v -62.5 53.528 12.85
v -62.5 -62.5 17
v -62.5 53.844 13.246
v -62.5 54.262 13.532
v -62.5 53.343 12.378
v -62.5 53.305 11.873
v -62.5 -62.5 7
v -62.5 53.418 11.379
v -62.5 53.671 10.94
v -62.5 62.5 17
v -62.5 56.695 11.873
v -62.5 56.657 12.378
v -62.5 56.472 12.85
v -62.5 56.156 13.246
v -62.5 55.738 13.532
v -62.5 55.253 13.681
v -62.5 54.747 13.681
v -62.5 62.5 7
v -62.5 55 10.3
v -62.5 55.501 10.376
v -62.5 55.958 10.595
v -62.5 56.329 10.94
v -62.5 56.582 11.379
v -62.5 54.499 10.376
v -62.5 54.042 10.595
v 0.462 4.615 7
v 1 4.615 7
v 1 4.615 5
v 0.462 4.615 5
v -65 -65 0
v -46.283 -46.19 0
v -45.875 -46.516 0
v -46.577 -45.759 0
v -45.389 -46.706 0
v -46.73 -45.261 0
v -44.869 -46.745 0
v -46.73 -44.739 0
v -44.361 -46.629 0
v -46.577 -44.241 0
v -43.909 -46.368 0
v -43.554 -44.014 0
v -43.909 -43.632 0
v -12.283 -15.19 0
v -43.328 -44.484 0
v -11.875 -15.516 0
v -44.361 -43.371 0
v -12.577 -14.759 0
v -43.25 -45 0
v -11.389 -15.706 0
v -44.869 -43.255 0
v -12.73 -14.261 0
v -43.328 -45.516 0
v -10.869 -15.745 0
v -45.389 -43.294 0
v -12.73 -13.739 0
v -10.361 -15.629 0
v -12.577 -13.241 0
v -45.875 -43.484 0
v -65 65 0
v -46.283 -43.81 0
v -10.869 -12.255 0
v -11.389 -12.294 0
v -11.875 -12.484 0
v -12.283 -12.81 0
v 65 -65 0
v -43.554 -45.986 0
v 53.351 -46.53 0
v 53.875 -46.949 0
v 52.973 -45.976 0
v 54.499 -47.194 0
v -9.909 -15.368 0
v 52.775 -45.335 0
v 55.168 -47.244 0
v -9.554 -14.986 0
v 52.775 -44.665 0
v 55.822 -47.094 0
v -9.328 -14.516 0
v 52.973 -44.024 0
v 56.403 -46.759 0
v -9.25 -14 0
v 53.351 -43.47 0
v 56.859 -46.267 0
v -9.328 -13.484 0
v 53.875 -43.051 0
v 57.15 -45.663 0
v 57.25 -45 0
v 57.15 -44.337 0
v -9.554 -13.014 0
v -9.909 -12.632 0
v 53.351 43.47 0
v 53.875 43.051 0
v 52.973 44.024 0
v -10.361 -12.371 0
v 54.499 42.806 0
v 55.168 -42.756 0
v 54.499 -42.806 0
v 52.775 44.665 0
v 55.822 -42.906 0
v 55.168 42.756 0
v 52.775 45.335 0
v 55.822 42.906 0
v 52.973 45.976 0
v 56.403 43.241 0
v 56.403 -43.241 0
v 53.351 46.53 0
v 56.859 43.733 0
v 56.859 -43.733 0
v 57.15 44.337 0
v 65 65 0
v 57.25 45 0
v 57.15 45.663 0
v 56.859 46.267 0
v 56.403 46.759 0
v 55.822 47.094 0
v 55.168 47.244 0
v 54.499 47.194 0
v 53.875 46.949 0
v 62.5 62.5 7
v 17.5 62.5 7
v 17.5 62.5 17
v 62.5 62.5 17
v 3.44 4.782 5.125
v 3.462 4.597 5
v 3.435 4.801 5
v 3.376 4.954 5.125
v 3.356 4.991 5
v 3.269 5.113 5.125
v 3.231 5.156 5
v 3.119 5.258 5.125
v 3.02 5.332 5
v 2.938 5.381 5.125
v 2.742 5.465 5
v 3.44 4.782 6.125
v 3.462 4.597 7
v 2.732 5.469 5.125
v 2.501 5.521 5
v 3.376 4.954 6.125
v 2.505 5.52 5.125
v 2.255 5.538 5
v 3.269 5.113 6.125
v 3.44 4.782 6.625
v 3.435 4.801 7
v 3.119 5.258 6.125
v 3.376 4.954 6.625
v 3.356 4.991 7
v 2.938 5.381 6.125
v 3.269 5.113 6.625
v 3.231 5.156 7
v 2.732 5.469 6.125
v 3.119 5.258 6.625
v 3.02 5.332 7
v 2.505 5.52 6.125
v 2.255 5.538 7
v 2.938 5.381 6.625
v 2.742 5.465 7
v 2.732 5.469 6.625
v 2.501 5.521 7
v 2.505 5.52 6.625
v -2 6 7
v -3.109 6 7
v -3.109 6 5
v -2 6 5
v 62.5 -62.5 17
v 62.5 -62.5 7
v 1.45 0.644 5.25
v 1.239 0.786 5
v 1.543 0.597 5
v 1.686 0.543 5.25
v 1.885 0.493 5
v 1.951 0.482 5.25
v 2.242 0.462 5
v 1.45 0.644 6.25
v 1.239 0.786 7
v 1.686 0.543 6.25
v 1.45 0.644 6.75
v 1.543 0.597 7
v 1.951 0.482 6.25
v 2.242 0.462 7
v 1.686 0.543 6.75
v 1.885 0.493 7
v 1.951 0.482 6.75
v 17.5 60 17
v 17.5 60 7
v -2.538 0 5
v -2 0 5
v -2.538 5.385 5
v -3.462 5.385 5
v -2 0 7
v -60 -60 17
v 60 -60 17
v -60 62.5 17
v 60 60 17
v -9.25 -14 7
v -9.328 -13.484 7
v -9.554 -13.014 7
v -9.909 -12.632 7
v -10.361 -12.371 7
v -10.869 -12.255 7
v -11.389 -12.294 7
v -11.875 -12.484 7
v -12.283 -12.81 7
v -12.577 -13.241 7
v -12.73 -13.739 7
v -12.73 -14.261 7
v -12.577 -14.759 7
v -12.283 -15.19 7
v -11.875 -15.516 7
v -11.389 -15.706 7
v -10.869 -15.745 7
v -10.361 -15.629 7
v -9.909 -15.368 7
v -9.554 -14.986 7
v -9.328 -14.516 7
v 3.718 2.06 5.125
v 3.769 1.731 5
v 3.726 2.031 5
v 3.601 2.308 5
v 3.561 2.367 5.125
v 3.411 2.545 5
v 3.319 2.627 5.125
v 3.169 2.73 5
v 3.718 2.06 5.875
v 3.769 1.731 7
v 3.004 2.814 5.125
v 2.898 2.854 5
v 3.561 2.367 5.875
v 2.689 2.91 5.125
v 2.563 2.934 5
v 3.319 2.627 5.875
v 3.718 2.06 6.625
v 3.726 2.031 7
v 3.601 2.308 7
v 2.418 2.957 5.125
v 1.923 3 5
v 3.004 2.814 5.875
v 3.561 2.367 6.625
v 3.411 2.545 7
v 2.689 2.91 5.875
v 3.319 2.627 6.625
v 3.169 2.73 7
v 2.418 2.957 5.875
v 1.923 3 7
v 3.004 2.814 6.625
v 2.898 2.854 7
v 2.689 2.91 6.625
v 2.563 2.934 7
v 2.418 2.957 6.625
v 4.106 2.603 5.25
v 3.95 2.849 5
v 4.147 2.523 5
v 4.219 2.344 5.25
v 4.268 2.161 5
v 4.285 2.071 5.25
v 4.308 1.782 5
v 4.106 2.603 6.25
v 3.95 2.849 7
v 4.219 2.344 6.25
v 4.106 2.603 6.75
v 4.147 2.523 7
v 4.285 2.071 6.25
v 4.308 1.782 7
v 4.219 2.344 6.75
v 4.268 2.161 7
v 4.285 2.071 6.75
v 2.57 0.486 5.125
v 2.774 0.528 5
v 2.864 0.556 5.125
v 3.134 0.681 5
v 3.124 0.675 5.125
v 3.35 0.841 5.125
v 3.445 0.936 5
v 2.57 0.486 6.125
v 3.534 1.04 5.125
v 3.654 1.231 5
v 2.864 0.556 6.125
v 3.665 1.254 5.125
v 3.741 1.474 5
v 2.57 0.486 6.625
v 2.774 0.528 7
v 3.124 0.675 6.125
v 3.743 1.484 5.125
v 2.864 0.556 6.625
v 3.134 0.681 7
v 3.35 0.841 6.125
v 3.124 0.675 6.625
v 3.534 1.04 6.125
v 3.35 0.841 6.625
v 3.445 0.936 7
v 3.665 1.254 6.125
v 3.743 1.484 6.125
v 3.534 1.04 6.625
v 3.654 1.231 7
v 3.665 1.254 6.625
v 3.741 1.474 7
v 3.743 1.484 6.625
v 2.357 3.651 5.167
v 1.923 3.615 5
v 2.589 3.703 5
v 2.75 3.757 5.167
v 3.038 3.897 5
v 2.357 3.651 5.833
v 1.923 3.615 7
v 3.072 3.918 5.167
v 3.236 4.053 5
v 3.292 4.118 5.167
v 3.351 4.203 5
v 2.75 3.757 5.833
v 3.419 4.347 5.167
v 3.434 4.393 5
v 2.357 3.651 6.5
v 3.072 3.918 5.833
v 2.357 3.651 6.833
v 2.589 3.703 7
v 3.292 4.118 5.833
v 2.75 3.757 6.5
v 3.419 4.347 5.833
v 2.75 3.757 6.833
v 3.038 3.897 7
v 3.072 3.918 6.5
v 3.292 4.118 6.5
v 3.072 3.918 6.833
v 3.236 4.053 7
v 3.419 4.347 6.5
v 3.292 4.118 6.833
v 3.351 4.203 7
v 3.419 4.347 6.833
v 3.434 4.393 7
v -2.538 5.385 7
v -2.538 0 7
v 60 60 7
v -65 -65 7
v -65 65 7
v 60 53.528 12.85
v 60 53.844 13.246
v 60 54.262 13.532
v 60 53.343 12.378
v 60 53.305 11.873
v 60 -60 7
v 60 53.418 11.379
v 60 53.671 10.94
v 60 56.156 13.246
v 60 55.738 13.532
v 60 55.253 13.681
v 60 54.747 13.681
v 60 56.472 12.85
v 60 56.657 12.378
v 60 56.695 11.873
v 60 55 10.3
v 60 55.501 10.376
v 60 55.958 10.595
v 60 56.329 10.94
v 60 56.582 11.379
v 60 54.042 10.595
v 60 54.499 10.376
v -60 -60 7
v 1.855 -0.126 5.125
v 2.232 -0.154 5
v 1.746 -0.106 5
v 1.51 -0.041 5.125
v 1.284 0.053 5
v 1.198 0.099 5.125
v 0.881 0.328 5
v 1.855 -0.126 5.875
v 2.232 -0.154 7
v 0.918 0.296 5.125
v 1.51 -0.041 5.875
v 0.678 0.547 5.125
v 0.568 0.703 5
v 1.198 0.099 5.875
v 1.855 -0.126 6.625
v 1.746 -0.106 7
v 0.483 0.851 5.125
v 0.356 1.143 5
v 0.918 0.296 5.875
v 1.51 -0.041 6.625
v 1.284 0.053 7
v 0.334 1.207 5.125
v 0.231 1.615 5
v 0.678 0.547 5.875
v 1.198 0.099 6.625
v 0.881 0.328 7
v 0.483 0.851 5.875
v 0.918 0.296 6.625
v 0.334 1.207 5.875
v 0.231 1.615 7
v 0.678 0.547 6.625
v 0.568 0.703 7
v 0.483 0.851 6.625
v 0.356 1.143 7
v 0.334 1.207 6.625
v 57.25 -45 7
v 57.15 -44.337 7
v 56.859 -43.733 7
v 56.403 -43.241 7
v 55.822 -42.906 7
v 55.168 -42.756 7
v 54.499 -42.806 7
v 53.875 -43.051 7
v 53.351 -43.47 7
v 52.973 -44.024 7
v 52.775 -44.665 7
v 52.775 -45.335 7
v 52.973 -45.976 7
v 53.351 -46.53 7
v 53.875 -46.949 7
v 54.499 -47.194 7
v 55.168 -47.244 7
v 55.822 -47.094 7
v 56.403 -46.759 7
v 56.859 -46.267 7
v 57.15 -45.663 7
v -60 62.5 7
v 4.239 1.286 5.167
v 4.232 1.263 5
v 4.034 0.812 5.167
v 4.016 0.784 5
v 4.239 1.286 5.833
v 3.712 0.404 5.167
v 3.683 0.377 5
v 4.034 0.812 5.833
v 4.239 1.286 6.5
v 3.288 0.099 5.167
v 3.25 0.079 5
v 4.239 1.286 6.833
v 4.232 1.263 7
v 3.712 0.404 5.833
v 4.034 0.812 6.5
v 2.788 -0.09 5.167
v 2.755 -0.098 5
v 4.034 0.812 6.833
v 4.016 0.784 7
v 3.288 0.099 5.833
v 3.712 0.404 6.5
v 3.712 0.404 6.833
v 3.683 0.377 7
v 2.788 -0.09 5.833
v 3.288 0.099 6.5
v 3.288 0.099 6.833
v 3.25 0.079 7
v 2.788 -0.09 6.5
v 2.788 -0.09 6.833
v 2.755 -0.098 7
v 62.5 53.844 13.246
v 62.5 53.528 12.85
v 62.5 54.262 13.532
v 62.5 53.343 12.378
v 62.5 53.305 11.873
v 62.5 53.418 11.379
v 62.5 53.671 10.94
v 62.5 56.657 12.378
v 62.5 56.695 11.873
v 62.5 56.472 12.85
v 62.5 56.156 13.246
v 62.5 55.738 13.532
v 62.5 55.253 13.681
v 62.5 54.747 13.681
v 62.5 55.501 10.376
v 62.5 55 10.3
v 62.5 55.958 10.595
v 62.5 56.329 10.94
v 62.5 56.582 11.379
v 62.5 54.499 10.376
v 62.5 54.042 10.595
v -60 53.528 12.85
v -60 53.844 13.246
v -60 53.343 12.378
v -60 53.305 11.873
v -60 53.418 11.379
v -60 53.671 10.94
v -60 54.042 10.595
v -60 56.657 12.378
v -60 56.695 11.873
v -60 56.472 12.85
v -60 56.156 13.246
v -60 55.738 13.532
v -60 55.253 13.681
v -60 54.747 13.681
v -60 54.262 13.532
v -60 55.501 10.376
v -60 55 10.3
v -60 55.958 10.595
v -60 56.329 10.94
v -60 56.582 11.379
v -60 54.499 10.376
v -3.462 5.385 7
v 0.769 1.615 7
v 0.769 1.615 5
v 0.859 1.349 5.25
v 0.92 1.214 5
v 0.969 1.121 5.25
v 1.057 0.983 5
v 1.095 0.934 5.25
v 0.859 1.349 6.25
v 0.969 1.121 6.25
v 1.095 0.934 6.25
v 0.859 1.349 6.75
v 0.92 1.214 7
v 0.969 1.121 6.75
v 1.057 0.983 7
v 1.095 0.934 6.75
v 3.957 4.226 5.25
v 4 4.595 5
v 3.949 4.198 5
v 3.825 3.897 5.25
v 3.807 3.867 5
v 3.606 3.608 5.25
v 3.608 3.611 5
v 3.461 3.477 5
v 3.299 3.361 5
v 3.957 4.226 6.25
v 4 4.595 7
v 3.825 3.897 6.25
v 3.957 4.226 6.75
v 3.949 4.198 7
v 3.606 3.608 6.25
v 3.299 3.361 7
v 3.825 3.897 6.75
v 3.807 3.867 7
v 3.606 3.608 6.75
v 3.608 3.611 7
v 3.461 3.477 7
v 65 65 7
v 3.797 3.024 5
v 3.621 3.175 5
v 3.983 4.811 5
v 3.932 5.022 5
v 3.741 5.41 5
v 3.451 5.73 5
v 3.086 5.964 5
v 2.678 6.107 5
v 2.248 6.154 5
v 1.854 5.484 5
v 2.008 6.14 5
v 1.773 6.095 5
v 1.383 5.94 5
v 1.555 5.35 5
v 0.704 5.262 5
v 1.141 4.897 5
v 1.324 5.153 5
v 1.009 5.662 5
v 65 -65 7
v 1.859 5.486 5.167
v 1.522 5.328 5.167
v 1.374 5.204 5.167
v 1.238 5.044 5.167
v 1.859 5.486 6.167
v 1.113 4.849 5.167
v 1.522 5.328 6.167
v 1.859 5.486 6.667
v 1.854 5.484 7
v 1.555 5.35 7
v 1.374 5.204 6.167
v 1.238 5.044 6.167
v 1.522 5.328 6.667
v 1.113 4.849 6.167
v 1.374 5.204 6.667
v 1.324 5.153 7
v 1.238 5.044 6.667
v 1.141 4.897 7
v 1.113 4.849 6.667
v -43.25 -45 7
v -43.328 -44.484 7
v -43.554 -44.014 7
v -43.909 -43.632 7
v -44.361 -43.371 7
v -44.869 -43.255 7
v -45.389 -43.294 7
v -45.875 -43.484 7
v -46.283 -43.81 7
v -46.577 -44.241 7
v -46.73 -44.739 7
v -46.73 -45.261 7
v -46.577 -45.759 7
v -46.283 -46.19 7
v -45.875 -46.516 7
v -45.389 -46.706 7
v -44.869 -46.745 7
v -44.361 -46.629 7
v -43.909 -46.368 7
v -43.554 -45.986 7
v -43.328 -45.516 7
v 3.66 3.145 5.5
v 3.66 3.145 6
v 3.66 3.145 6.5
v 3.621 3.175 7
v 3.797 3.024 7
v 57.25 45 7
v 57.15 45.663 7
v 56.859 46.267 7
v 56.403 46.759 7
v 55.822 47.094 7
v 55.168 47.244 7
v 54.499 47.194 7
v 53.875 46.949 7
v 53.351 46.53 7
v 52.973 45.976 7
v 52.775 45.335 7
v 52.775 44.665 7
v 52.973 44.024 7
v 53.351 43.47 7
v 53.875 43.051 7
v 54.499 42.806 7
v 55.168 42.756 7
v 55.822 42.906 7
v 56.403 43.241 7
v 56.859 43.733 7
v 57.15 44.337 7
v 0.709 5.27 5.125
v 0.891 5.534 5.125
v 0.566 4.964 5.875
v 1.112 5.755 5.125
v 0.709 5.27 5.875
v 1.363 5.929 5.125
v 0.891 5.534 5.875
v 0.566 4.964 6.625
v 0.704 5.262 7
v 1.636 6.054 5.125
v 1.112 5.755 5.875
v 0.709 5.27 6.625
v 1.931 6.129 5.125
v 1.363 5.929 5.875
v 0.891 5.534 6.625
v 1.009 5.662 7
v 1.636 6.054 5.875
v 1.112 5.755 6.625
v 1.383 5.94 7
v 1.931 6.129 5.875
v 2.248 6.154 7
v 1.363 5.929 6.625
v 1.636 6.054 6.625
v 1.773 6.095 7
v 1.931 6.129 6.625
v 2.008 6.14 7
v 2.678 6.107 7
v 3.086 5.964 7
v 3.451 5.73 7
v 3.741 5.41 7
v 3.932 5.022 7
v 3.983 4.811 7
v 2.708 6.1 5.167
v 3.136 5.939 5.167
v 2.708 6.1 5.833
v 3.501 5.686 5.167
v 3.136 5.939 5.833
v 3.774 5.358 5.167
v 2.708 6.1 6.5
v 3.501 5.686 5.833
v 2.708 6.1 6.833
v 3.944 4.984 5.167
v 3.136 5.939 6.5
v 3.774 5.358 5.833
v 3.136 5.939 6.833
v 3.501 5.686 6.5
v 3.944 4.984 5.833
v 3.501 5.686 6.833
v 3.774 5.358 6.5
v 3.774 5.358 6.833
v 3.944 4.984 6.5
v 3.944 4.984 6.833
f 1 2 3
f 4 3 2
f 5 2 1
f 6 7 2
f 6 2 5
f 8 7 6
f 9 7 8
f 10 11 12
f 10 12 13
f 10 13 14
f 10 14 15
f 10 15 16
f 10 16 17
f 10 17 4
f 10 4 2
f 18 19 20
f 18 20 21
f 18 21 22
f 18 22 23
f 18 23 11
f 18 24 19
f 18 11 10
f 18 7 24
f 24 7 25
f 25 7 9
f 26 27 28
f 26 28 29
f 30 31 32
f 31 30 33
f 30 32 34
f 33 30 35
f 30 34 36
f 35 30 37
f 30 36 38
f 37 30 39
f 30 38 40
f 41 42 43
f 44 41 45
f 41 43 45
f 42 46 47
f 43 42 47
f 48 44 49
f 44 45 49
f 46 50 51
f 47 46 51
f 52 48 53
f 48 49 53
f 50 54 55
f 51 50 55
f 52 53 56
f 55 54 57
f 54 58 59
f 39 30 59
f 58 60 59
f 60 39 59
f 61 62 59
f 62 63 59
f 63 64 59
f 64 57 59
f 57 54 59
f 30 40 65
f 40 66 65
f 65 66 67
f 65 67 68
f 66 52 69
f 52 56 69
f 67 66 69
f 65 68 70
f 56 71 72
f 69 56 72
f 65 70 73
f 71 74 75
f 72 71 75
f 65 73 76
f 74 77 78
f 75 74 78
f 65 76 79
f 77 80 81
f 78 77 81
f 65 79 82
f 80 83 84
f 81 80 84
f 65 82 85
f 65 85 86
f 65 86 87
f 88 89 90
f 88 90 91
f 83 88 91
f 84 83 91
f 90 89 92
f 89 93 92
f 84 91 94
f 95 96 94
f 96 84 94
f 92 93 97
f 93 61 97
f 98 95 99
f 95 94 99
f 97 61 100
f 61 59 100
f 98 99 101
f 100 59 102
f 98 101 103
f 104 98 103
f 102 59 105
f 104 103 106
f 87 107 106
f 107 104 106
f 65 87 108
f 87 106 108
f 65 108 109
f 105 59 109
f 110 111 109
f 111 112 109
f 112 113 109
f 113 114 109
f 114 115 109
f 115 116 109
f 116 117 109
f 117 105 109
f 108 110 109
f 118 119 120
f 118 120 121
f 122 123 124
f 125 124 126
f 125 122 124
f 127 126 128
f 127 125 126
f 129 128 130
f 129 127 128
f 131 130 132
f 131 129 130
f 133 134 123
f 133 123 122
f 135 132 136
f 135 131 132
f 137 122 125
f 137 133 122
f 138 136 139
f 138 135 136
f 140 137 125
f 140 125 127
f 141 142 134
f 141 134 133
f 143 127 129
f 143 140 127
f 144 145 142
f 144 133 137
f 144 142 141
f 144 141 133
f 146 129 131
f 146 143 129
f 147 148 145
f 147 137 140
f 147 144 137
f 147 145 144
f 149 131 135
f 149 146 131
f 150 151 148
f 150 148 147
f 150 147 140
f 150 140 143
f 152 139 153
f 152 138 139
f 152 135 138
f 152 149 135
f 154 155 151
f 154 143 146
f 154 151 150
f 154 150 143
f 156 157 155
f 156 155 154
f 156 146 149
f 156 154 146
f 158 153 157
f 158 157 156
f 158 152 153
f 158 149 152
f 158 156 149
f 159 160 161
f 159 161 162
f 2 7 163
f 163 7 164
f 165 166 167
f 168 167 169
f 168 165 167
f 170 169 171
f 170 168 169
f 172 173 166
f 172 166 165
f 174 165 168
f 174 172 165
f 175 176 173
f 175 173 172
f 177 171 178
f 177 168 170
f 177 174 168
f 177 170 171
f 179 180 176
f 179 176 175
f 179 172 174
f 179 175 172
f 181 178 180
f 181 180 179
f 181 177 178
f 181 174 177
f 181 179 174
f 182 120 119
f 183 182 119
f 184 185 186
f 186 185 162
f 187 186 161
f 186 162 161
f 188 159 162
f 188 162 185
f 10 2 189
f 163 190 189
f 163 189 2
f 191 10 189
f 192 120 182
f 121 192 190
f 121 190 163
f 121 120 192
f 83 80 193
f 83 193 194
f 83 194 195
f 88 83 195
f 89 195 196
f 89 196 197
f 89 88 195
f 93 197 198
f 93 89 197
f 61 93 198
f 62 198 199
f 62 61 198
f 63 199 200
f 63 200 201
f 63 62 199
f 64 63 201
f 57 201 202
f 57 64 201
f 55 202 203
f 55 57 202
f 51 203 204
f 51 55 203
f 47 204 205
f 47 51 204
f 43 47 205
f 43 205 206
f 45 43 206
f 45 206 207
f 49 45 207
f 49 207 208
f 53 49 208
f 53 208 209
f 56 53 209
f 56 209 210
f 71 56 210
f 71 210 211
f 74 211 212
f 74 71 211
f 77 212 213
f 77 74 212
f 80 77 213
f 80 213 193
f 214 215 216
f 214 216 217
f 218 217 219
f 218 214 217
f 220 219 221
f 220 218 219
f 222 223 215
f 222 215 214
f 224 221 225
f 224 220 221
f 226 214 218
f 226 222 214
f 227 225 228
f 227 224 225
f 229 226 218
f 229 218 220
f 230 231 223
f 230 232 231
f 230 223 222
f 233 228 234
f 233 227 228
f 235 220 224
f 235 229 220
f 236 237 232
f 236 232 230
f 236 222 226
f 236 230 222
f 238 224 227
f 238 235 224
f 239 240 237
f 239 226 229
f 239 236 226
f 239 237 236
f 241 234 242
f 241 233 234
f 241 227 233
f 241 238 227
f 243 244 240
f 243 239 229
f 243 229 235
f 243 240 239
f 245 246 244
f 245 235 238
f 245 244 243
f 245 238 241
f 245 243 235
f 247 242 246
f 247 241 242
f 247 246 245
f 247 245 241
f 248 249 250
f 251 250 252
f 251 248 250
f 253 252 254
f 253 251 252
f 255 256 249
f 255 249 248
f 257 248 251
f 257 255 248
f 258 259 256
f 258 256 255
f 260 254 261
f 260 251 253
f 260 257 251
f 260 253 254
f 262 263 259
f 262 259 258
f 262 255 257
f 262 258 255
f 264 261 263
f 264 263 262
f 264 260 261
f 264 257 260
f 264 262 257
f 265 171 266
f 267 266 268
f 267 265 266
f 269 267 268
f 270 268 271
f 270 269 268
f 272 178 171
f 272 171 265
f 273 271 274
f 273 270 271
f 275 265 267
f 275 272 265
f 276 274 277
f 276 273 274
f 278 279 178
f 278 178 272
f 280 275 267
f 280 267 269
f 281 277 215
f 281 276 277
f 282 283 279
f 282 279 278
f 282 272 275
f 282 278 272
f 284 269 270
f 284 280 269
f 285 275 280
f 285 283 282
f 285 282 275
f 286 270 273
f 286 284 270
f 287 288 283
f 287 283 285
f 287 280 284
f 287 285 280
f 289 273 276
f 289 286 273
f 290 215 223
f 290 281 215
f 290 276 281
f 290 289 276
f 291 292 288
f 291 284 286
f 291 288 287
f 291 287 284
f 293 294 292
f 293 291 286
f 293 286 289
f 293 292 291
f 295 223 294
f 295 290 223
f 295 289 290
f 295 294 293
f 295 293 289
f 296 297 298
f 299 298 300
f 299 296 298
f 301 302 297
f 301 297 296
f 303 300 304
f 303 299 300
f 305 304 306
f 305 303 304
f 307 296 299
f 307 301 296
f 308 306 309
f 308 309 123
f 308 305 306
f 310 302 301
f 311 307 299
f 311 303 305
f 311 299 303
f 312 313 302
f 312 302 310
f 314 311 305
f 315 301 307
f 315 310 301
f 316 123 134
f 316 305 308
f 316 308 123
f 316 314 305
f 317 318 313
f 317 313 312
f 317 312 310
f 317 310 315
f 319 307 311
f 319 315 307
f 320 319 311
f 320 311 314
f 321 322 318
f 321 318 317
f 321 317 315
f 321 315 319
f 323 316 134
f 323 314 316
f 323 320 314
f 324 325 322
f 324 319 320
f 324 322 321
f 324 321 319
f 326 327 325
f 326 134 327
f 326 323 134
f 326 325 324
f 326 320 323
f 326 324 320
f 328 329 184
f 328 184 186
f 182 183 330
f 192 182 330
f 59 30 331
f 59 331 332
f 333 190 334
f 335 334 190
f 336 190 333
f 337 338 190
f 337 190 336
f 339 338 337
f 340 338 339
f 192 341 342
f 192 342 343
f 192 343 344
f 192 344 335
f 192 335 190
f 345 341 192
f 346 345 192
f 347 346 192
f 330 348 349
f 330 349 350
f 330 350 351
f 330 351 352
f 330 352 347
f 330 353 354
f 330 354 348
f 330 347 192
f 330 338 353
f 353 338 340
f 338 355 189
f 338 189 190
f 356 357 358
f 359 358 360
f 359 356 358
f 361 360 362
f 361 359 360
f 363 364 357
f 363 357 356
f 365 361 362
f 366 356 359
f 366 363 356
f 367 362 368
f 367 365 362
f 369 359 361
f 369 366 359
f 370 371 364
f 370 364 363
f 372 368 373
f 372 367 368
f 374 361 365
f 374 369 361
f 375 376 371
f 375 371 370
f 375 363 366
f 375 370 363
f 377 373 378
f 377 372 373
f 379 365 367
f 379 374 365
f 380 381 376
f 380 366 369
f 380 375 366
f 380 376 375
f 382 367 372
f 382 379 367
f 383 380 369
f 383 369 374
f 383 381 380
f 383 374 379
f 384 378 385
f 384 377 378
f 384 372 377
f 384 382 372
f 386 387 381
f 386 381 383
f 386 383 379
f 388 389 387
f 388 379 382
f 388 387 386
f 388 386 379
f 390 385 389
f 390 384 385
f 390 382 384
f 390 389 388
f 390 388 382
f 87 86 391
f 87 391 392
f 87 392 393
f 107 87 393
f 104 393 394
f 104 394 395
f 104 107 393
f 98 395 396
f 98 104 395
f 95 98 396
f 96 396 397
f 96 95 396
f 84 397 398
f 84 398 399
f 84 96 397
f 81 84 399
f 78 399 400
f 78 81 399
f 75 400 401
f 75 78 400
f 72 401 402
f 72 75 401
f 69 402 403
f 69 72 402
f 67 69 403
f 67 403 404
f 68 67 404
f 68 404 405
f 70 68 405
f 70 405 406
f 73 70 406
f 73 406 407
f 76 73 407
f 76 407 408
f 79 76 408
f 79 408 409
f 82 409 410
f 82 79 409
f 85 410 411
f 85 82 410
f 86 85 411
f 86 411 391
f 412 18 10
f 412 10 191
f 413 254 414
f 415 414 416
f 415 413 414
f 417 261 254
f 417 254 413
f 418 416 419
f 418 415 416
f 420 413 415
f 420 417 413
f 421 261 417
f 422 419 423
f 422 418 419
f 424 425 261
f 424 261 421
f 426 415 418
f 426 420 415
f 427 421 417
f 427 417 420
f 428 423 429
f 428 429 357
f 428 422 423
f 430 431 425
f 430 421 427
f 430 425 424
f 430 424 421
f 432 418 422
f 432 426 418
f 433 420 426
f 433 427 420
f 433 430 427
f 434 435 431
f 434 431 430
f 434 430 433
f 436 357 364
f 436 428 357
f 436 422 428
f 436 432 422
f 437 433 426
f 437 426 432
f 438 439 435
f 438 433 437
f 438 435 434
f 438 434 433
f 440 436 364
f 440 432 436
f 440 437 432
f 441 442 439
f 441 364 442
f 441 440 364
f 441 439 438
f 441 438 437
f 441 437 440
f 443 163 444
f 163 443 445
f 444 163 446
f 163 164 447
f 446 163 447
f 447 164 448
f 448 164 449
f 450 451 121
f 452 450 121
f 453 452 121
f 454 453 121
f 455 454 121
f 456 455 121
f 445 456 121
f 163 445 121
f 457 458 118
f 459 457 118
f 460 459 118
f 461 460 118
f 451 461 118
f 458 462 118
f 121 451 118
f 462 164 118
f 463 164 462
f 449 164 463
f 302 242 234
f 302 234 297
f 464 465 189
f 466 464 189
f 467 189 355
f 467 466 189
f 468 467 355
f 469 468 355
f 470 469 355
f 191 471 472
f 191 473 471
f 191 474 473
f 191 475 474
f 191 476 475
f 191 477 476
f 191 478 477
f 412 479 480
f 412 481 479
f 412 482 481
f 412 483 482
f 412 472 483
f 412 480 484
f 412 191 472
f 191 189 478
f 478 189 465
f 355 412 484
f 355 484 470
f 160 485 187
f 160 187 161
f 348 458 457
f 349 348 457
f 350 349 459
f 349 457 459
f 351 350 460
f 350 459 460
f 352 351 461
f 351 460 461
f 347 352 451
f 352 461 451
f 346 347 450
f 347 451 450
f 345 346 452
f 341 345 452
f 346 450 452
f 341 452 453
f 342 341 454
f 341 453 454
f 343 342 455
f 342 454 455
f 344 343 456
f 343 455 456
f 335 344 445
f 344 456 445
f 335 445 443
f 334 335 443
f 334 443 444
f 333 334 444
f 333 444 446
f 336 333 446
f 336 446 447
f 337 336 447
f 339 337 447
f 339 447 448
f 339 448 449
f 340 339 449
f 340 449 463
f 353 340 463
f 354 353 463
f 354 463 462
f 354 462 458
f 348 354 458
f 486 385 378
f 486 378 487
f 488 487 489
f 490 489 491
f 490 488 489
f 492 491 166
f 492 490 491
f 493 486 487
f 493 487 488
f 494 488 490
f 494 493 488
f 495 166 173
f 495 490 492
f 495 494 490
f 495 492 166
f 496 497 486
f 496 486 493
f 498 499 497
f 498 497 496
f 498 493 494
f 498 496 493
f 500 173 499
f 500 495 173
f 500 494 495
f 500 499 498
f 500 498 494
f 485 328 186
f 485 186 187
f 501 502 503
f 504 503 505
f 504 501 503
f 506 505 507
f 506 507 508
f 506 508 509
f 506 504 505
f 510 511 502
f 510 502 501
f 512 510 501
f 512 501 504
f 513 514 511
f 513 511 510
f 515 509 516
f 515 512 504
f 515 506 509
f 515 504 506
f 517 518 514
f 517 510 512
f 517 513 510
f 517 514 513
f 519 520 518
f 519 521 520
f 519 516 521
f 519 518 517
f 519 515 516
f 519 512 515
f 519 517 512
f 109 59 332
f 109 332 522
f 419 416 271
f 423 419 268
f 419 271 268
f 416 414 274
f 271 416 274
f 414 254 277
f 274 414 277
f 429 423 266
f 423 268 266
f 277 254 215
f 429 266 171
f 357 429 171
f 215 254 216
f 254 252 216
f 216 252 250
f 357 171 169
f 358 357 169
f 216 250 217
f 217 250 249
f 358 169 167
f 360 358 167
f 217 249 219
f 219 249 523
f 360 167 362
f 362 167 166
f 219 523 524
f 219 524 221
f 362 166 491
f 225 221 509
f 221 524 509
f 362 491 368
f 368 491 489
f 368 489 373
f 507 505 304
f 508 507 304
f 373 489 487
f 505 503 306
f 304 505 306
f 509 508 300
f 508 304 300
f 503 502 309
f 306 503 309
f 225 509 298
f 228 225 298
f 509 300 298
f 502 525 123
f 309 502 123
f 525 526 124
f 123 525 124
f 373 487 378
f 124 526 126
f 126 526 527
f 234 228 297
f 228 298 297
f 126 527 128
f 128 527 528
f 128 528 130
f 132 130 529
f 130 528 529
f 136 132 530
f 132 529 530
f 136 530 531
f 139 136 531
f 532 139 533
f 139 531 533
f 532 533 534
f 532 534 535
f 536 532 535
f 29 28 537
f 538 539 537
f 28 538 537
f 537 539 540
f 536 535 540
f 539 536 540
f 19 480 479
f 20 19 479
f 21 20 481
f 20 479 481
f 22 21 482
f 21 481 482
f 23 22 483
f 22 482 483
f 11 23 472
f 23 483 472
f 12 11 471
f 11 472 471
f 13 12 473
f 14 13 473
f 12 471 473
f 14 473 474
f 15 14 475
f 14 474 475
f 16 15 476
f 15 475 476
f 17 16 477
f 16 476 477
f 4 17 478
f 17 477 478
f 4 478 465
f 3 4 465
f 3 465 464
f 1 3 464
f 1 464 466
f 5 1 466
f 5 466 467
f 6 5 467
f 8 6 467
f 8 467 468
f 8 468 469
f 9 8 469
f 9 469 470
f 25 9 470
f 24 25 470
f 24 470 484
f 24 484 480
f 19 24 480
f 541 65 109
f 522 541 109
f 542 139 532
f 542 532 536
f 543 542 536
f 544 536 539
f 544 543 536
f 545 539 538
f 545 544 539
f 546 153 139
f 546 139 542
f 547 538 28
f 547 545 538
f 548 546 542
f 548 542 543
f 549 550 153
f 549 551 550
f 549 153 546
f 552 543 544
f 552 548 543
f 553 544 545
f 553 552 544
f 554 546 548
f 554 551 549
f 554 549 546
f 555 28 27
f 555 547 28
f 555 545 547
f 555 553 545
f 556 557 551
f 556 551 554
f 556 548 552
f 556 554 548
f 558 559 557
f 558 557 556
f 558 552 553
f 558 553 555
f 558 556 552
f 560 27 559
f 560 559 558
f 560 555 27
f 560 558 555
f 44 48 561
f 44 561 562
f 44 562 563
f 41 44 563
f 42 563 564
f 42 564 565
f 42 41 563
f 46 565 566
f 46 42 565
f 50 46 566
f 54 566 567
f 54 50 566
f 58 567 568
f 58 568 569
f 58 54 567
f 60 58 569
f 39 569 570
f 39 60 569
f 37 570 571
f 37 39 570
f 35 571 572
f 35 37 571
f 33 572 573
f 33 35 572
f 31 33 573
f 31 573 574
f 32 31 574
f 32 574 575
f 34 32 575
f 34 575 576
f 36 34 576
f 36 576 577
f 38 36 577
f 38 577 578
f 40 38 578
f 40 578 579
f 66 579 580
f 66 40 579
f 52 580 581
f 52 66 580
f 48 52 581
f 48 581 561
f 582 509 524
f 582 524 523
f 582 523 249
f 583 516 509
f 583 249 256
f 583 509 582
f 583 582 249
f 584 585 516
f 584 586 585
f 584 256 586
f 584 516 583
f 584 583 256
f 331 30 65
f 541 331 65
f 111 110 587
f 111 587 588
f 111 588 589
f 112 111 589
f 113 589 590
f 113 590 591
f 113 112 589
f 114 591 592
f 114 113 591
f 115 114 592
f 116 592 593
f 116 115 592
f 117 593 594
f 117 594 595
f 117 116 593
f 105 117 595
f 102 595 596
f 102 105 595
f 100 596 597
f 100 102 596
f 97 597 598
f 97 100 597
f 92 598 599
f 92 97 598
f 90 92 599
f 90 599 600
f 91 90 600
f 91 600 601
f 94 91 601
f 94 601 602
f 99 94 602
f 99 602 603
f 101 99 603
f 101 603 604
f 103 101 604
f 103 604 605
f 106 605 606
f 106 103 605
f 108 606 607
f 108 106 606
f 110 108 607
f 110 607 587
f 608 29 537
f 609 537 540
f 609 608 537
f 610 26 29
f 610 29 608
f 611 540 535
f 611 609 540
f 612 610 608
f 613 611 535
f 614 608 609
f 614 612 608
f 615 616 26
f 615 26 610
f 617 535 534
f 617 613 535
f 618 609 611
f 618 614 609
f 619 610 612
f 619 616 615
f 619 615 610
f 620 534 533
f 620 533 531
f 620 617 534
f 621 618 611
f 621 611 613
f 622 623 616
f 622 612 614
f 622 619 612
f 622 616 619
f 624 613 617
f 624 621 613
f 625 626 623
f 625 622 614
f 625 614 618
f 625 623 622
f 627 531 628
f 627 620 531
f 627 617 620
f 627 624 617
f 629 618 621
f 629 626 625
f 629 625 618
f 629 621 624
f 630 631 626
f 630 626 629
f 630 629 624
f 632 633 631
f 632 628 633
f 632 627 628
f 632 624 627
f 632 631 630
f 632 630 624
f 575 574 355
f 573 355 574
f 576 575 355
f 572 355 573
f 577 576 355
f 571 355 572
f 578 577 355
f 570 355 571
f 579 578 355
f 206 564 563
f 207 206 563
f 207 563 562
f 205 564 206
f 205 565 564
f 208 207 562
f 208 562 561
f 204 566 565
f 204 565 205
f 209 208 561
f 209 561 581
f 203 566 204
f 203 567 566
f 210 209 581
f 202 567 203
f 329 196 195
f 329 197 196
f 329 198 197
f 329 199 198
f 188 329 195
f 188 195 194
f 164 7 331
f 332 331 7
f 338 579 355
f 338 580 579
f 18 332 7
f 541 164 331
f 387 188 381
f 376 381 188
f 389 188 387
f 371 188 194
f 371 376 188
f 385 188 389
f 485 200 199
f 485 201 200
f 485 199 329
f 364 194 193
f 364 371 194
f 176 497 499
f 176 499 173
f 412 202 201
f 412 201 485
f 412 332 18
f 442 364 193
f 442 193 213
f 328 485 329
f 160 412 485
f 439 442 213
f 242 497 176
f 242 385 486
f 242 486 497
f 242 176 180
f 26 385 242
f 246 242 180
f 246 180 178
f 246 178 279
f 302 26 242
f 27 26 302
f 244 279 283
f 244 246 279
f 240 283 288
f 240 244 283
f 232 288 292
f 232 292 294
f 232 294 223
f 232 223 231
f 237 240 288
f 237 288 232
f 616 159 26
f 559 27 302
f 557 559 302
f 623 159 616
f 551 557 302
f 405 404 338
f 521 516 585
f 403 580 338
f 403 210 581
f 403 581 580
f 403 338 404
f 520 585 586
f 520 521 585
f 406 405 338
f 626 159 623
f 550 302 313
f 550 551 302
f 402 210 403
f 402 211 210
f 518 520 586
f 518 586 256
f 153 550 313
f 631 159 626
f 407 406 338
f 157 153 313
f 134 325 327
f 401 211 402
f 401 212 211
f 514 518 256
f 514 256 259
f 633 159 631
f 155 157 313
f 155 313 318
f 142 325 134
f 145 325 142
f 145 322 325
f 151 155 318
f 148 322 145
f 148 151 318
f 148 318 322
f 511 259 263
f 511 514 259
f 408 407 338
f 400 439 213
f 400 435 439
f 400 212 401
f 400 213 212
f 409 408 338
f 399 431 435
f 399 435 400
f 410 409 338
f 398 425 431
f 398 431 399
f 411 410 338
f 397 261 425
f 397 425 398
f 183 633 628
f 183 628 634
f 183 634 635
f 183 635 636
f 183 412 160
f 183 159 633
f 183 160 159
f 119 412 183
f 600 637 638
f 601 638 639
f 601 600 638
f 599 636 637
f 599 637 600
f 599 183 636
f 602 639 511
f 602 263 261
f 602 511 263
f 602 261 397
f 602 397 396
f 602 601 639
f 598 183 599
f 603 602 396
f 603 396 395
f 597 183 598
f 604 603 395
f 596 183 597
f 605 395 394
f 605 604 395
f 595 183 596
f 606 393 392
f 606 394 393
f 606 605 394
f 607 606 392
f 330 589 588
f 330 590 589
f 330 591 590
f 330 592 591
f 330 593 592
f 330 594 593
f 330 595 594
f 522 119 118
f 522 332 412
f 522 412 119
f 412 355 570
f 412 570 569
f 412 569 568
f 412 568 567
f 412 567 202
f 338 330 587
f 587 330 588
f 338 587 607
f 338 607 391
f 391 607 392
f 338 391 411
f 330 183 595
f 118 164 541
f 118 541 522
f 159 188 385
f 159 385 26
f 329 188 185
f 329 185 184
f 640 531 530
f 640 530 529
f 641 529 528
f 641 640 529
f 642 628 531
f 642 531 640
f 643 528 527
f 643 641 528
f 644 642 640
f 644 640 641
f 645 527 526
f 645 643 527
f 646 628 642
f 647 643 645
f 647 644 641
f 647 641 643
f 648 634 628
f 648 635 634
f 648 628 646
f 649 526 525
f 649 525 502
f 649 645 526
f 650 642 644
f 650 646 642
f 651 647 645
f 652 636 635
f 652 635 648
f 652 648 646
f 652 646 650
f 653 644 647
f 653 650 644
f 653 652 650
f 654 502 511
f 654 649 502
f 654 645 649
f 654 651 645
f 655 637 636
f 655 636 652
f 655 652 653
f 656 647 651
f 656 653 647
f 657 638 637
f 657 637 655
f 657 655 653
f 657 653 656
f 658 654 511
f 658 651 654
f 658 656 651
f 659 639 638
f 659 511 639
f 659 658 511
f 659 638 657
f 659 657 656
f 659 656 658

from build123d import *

# Parameters (mm, degrees)
CROQUIS1_W              = 130
CROQUIS1_H              = 130
CROQUIS1_R              = 1.75
CROQUIS1_R_2            = 2.25
SALIENTE_EXTRUIR1_DEPTH = 7
CORTAR_EXTRUIR1_DEPTH   = 2
CROQUIS4_W              = 125
CROQUIS4_H              = 125
CROQUIS4_W_2            = 120
CROQUIS4_H_2            = 120
SALIENTE_EXTRUIR2_DEPTH = 10
CROQUIS6_R              = 1.7
CORTAR_EXTRUIR2_DEPTH   = 145.118874545
CORTAR_EXTRUIR3_REACH   = 146.119
CROQUIS7_W              = 77.5
CROQUIS7_H              = 10


with BuildPart() as part:
    # Croquis1 → Saliente-Extruir1 (new body)
    with BuildSketch(Plane.XY):
        Rectangle(CROQUIS1_W, CROQUIS1_H)
        with Locations((-11, -14)):
            Circle(CROQUIS1_R, mode=Mode.SUBTRACT)
        with Locations((-45, -45)):
            Circle(CROQUIS1_R, mode=Mode.SUBTRACT)
        with Locations((55, 45)):
            Circle(CROQUIS1_R_2, mode=Mode.SUBTRACT)
        with Locations((55, -45)):
            Circle(CROQUIS1_R_2, mode=Mode.SUBTRACT)
    extrude(amount=SALIENTE_EXTRUIR1_DEPTH)

    # Croquis2 → Cortar-Extruir1 (cut)
    with BuildSketch(Plane.XY.offset(7)):
        Polygon((-3.109375, 6), (-2, 6), (-2, 0), (-2.538461538, 0), (-2.538461538, 5.384615385), (-3.461538462, 5.384615385), align=None)
        with BuildLine():
            Line((1, 4.615384615), (0.461538462, 4.615384615))
            add(Edge.make_bspline(
                [(0.461538462, 4.615384615), (0.476126263, 4.675783159), (0.504644221, 4.793857373), (0.564125775, 4.962555534), (0.628924499, 5.122195856), (0.706734392, 5.269789126), (0.791606542, 5.40830153), (0.888845493, 5.534591458), (0.993965018, 5.651870827), (1.110236359, 5.755950663), (1.232171208, 5.850198199), (1.361487699, 5.93055544), (1.495584088, 5.999682559), (1.635389459, 6.056631528), (1.781320039, 6.099532426), (1.932056536, 6.130658378), (2.087993965, 6.150871717), (2.193846977, 6.152844454), (2.247596154, 6.153846154)],
                knots=[0, 0, 0, 0, 1.162005537, 2.271625781, 3.343758855, 4.383309926, 5.390229558, 6.379919256, 7.361854164, 8.333198761, 9.295911338, 10.242430842, 11.177959212, 12.116337295, 13.062827104, 14.020064771, 14.994644689, 16, 16, 16, 16], degree=3))
            add(Edge.make_bspline(
                [(2.247596154, 6.153846154), (2.325909426, 6.151481759), (2.48082773, 6.146804544), (2.708421525, 6.104094082), (2.927896072, 6.03650814), (3.136849069, 5.943124608), (3.33093781, 5.827946357), (3.503628416, 5.690863951), (3.652580149, 5.534522291), (3.777541939, 5.361837895), (3.875384795, 5.177285593), (3.947532863, 4.987342467), (3.991455745, 4.792459087), (3.997148128, 4.66087518), (4, 4.594951923)],
                knots=[0, 0, 0, 0, 1.083050992, 2.142477498, 3.193116406, 4.255571735, 5.30263384, 6.308962982, 7.297363603, 8.282367274, 9.249857812, 10.179914175, 11.08814088, 12, 12, 12, 12], degree=3))
            add(Edge.make_bspline(
                [(4, 4.594951923), (3.998005272, 4.531511704), (3.9941019, 4.407369039), (3.960958405, 4.226132187), (3.905181954, 4.055318015), (3.827919504, 3.894207451), (3.727905418, 3.743822011), (3.606752223, 3.603823341), (3.463604803, 3.473590499), (3.355126624, 3.398985688), (3.299278846, 3.360576923)],
                knots=[0, 0, 0, 0, 1.024540389, 2.004866551, 2.965041327, 3.920577974, 4.882998113, 5.874504559, 6.905732034, 8, 8, 8, 8], degree=3))
            add(Edge.make_bspline(
                [(3.299278846, 3.360576923), (3.363104711, 3.3297572), (3.48956221, 3.268694416), (3.661934546, 3.148941689), (3.818410904, 3.010673665), (3.905674422, 2.902771974), (3.949519231, 2.848557692)],
                knots=[0, 0, 0, 0, 1.015518401, 2.012035669, 3.001164323, 4, 4, 4, 4], degree=3))
            add(Edge.make_bspline(
                [(3.949519231, 2.848557692), (3.978390103, 2.809030118), (4.035659068, 2.730622261), (4.106348554, 2.604559817), (4.170478465, 2.477100121), (4.220450269, 2.344826853), (4.259148327, 2.209273116), (4.286810096, 2.070206151), (4.303994338, 1.927512398), (4.306455284, 1.830976718), (4.307692308, 1.782451923)],
                knots=[0, 0, 0, 0, 1.025084078, 2.033381695, 3.024893161, 4.013698104, 4.991890475, 5.976764909, 6.982997093, 8, 8, 8, 8], degree=3))
            add(Edge.make_bspline(
                [(4.307692308, 1.782451923), (4.304615999, 1.698435258), (4.298477858, 1.530797312), (4.243613731, 1.283126361), (4.158562461, 1.0410255), (4.037779142, 0.809468632), (3.890577699, 0.592816551), (3.715450857, 0.39897145), (3.514388443, 0.232345271), (3.290150187, 0.093127737), (3.047206539, -0.01816013), (2.787362667, -0.09540146), (2.514362574, -0.145708888), (2.327150064, -0.151103521), (2.231971154, -0.153846154)],
                knots=[0, 0, 0, 0, 0.955779014, 1.907060117, 2.875433937, 3.871313158, 4.872415639, 5.851225146, 6.836215519, 7.83643374, 8.849228613, 9.86973379, 10.916971861, 12, 12, 12, 12], degree=3))
            add(Edge.make_bspline(
                [(2.231971154, -0.153846154), (2.167823782, -0.152357788), (2.041603145, -0.149429181), (1.856042862, -0.129408722), (1.678919949, -0.092842999), (1.509994924, -0.043637332), (1.349117718, 0.018748511), (1.196779252, 0.096437708), (1.052042292, 0.187828854), (0.916272662, 0.294000719), (0.789486545, 0.41276873), (0.675053304, 0.546241319), (0.571065087, 0.691951154), (0.480306278, 0.851590679), (0.398642931, 1.023096834), (0.331475577, 1.208665688), (0.272357459, 1.406638298), (0.24487152, 1.544600138), (0.230769231, 1.615384615)],
                knots=[0, 0, 0, 0, 1.048658725, 2.063410685, 3.046034179, 4.001477787, 4.936774919, 5.862367409, 6.792675028, 7.730719943, 8.675894397, 9.627829632, 10.600096036, 11.597688215, 12.626045268, 13.701542398, 14.82072376, 16, 16, 16, 16], degree=3))
            Line((0.230769231, 1.615384615), (0.769230769, 1.615384615))
            add(Edge.make_bspline(
                [(0.769230769, 1.615384615), (0.783259269, 1.569186307), (0.810545919, 1.479326584), (0.856993287, 1.350000346), (0.909910325, 1.231443683), (0.96667814, 1.122786903), (1.026298333, 1.022959927), (1.093009633, 0.934602437), (1.161871025, 0.853833519), (1.213778488, 0.80832847), (1.239182692, 0.786057692)],
                knots=[0, 0, 0, 0, 1.198163088, 2.33053128, 3.407730985, 4.417276592, 5.372219308, 6.28897303, 7.162600585, 8, 8, 8, 8], degree=3))
            add(Edge.make_bspline(
                [(1.239182692, 0.786057692), (1.272776823, 0.760157691), (1.339861388, 0.708437637), (1.449178356, 0.642434845), (1.564146732, 0.585244516), (1.687257602, 0.54155818), (1.815854352, 0.504567905), (1.952015549, 0.480361301), (2.094539921, 0.463753007), (2.191856087, 0.46228741), (2.241586538, 0.461538462)],
                knots=[0, 0, 0, 0, 0.946170439, 1.889420265, 2.845303464, 3.807233317, 4.801018734, 5.828864929, 6.890507805, 8, 8, 8, 8], degree=3))
            add(Edge.make_bspline(
                [(2.241586538, 0.461538462), (2.2977354, 0.462594299), (2.407529652, 0.464658898), (2.567737982, 0.483645824), (2.72015075, 0.511297962), (2.863075765, 0.554005932), (2.998385206, 0.606773106), (3.12418232, 0.673027515), (3.242118502, 0.750761324), (3.350683197, 0.839114167), (3.448304067, 0.93583673), (3.534257518, 1.037001995), (3.607328367, 1.142183417), (3.666271643, 1.251963053), (3.712815444, 1.365886303), (3.744500931, 1.484272867), (3.766532099, 1.606153895), (3.768326292, 1.689003556), (3.769230769, 1.730769231)],
                knots=[0, 0, 0, 0, 1.217147791, 2.380027433, 3.494444702, 4.572153297, 5.609568379, 6.639424714, 7.649109417, 8.668170816, 9.669597737, 10.625200337, 11.543417969, 12.441394052, 13.322311151, 14.205496177, 15.095365482, 16, 16, 16, 16], degree=3))
            add(Edge.make_bspline(
                [(3.769230769, 1.730769231), (3.766607395, 1.786674383), (3.761373701, 1.898206512), (3.721416136, 2.062293782), (3.655692369, 2.22039106), (3.563682349, 2.369800986), (3.451678243, 2.50827396), (3.320766974, 2.631825073), (3.16986144, 2.7337738), (3.030970236, 2.804211497), (2.907944253, 2.852275055), (2.802660737, 2.884289279), (2.684792274, 2.911398403), (2.555764247, 2.93661944), (2.414604448, 2.958084609), (2.261466554, 2.975984864), (2.096319534, 2.990307791), (1.981991821, 2.996703955), (1.923076923, 3)],
                knots=[0, 0, 0, 0, 1.07054697, 2.135767047, 3.216561865, 4.33974944, 5.486079747, 6.621378074, 7.775625952, 8.963672916, 9.598146892, 10.304877434, 11.070270905, 11.915000392, 12.823868403, 13.805723172, 14.86925407, 16, 16, 16, 16], degree=3))
            Line((1.923076923, 3), (1.923076923, 3.615384615))
            add(Edge.make_bspline(
                [(1.923076923, 3.615384615), (1.997307493, 3.616644279), (2.142706944, 3.61911165), (2.355097181, 3.648953954), (2.558194287, 3.690235031), (2.747497274, 3.753466789), (2.920037925, 3.826907298), (3.069728672, 3.912368228), (3.194472353, 4.007364941), (3.293662761, 4.1133637), (3.368284296, 4.227046639), (3.42284452, 4.345532337), (3.455073651, 4.469859299), (3.459375937, 4.554707301), (3.461538462, 4.597355769)],
                knots=[0, 0, 0, 0, 1.321986639, 2.589447074, 3.816329219, 5.01088745, 6.139805852, 7.153945165, 8.075214402, 8.924034688, 9.728124013, 10.488707548, 11.240355623, 12, 12, 12, 12], degree=3))
            add(Edge.make_bspline(
                [(3.461538462, 4.597355769), (3.460828043, 4.628689047), (3.459414698, 4.691025116), (3.441590793, 4.782096662), (3.414806723, 4.870383998), (3.37798433, 4.955511673), (3.328698275, 5.036889285), (3.269716584, 5.115210626), (3.199485555, 5.190028533), (3.119007646, 5.259766224), (3.032587409, 5.326227773), (2.937873509, 5.382651151), (2.837721723, 5.430899829), (2.732021172, 5.470687547), (2.620428835, 5.500617755), (2.503469021, 5.522107769), (2.380918707, 5.535543748), (2.297310023, 5.537478176), (2.254807692, 5.538461538)],
                knots=[0, 0, 0, 0, 0.884392785, 1.759457502, 2.611959086, 3.489218968, 4.37281399, 5.2945488, 6.255912374, 7.266815255, 8.301784654, 9.332968512, 10.37626691, 11.440494194, 12.520033166, 13.637162961, 14.798855837, 16, 16, 16, 16], degree=3))
            add(Edge.make_bspline(
                [(2.254807692, 5.538461538), (2.186490547, 5.536076346), (2.053051273, 5.531417512), (1.860682844, 5.490612346), (1.6818497, 5.42550706), (1.545154843, 5.347793312), (1.444213288, 5.271078283), (1.372081394, 5.204079906), (1.301246233, 5.129623637), (1.23636793, 5.043123565), (1.170755398, 4.950437639), (1.111021864, 4.846854185), (1.052976678, 4.735075223), (1.018000878, 4.656054136), (1, 4.615384615)],
                knots=[0, 0, 0, 0, 1.472543308, 2.876219568, 4.221790263, 5.565193594, 6.249813518, 6.953379497, 7.687249741, 8.463570142, 9.283606569, 10.136032583, 11.040678096, 12, 12, 12, 12], degree=3))
        make_face()
    extrude(amount=-CORTAR_EXTRUIR1_DEPTH, mode=Mode.SUBTRACT)

    # Croquis4 → Saliente-Extruir2 (add)
    with BuildSketch(Plane.XY.offset(7)):
        Rectangle(CROQUIS4_W, CROQUIS4_H)
        Rectangle(CROQUIS4_W_2, CROQUIS4_H_2, mode=Mode.SUBTRACT)
    extrude(amount=SALIENTE_EXTRUIR2_DEPTH)

    # Croquis6 → Cortar-Extruir2 (cut, through all)
    with BuildSketch(Plane(origin=(62.5, 0, 0), x_dir=(0, 0, -1), z_dir=(1, 0, 0))):
        with Locations((-12, 55)):
            Circle(CROQUIS6_R)
    extrude(amount=-CORTAR_EXTRUIR2_DEPTH, mode=Mode.SUBTRACT)

    # Croquis7 → Cortar-Extruir3 (cut, up to next)
    with BuildSketch(Plane(origin=(0, 62.5, 0), x_dir=(1, 0, 0), z_dir=(0, 1, 0)), mode=Mode.PRIVATE) as cortar_extruir3_sk1:
        with Locations((-21.25, -12)):
            Rectangle(CROQUIS7_W, CROQUIS7_H)
    cortar_extruir3_tool1 = extrude(cortar_extruir3_sk1.sketch, amount=-CORTAR_EXTRUIR3_REACH, mode=Mode.PRIVATE) & part.part
    add(cortar_extruir3_tool1.solids().sort_by_distance((-21.25, 62.5, 12))[0], mode=Mode.SUBTRACT)


solid = part.part
